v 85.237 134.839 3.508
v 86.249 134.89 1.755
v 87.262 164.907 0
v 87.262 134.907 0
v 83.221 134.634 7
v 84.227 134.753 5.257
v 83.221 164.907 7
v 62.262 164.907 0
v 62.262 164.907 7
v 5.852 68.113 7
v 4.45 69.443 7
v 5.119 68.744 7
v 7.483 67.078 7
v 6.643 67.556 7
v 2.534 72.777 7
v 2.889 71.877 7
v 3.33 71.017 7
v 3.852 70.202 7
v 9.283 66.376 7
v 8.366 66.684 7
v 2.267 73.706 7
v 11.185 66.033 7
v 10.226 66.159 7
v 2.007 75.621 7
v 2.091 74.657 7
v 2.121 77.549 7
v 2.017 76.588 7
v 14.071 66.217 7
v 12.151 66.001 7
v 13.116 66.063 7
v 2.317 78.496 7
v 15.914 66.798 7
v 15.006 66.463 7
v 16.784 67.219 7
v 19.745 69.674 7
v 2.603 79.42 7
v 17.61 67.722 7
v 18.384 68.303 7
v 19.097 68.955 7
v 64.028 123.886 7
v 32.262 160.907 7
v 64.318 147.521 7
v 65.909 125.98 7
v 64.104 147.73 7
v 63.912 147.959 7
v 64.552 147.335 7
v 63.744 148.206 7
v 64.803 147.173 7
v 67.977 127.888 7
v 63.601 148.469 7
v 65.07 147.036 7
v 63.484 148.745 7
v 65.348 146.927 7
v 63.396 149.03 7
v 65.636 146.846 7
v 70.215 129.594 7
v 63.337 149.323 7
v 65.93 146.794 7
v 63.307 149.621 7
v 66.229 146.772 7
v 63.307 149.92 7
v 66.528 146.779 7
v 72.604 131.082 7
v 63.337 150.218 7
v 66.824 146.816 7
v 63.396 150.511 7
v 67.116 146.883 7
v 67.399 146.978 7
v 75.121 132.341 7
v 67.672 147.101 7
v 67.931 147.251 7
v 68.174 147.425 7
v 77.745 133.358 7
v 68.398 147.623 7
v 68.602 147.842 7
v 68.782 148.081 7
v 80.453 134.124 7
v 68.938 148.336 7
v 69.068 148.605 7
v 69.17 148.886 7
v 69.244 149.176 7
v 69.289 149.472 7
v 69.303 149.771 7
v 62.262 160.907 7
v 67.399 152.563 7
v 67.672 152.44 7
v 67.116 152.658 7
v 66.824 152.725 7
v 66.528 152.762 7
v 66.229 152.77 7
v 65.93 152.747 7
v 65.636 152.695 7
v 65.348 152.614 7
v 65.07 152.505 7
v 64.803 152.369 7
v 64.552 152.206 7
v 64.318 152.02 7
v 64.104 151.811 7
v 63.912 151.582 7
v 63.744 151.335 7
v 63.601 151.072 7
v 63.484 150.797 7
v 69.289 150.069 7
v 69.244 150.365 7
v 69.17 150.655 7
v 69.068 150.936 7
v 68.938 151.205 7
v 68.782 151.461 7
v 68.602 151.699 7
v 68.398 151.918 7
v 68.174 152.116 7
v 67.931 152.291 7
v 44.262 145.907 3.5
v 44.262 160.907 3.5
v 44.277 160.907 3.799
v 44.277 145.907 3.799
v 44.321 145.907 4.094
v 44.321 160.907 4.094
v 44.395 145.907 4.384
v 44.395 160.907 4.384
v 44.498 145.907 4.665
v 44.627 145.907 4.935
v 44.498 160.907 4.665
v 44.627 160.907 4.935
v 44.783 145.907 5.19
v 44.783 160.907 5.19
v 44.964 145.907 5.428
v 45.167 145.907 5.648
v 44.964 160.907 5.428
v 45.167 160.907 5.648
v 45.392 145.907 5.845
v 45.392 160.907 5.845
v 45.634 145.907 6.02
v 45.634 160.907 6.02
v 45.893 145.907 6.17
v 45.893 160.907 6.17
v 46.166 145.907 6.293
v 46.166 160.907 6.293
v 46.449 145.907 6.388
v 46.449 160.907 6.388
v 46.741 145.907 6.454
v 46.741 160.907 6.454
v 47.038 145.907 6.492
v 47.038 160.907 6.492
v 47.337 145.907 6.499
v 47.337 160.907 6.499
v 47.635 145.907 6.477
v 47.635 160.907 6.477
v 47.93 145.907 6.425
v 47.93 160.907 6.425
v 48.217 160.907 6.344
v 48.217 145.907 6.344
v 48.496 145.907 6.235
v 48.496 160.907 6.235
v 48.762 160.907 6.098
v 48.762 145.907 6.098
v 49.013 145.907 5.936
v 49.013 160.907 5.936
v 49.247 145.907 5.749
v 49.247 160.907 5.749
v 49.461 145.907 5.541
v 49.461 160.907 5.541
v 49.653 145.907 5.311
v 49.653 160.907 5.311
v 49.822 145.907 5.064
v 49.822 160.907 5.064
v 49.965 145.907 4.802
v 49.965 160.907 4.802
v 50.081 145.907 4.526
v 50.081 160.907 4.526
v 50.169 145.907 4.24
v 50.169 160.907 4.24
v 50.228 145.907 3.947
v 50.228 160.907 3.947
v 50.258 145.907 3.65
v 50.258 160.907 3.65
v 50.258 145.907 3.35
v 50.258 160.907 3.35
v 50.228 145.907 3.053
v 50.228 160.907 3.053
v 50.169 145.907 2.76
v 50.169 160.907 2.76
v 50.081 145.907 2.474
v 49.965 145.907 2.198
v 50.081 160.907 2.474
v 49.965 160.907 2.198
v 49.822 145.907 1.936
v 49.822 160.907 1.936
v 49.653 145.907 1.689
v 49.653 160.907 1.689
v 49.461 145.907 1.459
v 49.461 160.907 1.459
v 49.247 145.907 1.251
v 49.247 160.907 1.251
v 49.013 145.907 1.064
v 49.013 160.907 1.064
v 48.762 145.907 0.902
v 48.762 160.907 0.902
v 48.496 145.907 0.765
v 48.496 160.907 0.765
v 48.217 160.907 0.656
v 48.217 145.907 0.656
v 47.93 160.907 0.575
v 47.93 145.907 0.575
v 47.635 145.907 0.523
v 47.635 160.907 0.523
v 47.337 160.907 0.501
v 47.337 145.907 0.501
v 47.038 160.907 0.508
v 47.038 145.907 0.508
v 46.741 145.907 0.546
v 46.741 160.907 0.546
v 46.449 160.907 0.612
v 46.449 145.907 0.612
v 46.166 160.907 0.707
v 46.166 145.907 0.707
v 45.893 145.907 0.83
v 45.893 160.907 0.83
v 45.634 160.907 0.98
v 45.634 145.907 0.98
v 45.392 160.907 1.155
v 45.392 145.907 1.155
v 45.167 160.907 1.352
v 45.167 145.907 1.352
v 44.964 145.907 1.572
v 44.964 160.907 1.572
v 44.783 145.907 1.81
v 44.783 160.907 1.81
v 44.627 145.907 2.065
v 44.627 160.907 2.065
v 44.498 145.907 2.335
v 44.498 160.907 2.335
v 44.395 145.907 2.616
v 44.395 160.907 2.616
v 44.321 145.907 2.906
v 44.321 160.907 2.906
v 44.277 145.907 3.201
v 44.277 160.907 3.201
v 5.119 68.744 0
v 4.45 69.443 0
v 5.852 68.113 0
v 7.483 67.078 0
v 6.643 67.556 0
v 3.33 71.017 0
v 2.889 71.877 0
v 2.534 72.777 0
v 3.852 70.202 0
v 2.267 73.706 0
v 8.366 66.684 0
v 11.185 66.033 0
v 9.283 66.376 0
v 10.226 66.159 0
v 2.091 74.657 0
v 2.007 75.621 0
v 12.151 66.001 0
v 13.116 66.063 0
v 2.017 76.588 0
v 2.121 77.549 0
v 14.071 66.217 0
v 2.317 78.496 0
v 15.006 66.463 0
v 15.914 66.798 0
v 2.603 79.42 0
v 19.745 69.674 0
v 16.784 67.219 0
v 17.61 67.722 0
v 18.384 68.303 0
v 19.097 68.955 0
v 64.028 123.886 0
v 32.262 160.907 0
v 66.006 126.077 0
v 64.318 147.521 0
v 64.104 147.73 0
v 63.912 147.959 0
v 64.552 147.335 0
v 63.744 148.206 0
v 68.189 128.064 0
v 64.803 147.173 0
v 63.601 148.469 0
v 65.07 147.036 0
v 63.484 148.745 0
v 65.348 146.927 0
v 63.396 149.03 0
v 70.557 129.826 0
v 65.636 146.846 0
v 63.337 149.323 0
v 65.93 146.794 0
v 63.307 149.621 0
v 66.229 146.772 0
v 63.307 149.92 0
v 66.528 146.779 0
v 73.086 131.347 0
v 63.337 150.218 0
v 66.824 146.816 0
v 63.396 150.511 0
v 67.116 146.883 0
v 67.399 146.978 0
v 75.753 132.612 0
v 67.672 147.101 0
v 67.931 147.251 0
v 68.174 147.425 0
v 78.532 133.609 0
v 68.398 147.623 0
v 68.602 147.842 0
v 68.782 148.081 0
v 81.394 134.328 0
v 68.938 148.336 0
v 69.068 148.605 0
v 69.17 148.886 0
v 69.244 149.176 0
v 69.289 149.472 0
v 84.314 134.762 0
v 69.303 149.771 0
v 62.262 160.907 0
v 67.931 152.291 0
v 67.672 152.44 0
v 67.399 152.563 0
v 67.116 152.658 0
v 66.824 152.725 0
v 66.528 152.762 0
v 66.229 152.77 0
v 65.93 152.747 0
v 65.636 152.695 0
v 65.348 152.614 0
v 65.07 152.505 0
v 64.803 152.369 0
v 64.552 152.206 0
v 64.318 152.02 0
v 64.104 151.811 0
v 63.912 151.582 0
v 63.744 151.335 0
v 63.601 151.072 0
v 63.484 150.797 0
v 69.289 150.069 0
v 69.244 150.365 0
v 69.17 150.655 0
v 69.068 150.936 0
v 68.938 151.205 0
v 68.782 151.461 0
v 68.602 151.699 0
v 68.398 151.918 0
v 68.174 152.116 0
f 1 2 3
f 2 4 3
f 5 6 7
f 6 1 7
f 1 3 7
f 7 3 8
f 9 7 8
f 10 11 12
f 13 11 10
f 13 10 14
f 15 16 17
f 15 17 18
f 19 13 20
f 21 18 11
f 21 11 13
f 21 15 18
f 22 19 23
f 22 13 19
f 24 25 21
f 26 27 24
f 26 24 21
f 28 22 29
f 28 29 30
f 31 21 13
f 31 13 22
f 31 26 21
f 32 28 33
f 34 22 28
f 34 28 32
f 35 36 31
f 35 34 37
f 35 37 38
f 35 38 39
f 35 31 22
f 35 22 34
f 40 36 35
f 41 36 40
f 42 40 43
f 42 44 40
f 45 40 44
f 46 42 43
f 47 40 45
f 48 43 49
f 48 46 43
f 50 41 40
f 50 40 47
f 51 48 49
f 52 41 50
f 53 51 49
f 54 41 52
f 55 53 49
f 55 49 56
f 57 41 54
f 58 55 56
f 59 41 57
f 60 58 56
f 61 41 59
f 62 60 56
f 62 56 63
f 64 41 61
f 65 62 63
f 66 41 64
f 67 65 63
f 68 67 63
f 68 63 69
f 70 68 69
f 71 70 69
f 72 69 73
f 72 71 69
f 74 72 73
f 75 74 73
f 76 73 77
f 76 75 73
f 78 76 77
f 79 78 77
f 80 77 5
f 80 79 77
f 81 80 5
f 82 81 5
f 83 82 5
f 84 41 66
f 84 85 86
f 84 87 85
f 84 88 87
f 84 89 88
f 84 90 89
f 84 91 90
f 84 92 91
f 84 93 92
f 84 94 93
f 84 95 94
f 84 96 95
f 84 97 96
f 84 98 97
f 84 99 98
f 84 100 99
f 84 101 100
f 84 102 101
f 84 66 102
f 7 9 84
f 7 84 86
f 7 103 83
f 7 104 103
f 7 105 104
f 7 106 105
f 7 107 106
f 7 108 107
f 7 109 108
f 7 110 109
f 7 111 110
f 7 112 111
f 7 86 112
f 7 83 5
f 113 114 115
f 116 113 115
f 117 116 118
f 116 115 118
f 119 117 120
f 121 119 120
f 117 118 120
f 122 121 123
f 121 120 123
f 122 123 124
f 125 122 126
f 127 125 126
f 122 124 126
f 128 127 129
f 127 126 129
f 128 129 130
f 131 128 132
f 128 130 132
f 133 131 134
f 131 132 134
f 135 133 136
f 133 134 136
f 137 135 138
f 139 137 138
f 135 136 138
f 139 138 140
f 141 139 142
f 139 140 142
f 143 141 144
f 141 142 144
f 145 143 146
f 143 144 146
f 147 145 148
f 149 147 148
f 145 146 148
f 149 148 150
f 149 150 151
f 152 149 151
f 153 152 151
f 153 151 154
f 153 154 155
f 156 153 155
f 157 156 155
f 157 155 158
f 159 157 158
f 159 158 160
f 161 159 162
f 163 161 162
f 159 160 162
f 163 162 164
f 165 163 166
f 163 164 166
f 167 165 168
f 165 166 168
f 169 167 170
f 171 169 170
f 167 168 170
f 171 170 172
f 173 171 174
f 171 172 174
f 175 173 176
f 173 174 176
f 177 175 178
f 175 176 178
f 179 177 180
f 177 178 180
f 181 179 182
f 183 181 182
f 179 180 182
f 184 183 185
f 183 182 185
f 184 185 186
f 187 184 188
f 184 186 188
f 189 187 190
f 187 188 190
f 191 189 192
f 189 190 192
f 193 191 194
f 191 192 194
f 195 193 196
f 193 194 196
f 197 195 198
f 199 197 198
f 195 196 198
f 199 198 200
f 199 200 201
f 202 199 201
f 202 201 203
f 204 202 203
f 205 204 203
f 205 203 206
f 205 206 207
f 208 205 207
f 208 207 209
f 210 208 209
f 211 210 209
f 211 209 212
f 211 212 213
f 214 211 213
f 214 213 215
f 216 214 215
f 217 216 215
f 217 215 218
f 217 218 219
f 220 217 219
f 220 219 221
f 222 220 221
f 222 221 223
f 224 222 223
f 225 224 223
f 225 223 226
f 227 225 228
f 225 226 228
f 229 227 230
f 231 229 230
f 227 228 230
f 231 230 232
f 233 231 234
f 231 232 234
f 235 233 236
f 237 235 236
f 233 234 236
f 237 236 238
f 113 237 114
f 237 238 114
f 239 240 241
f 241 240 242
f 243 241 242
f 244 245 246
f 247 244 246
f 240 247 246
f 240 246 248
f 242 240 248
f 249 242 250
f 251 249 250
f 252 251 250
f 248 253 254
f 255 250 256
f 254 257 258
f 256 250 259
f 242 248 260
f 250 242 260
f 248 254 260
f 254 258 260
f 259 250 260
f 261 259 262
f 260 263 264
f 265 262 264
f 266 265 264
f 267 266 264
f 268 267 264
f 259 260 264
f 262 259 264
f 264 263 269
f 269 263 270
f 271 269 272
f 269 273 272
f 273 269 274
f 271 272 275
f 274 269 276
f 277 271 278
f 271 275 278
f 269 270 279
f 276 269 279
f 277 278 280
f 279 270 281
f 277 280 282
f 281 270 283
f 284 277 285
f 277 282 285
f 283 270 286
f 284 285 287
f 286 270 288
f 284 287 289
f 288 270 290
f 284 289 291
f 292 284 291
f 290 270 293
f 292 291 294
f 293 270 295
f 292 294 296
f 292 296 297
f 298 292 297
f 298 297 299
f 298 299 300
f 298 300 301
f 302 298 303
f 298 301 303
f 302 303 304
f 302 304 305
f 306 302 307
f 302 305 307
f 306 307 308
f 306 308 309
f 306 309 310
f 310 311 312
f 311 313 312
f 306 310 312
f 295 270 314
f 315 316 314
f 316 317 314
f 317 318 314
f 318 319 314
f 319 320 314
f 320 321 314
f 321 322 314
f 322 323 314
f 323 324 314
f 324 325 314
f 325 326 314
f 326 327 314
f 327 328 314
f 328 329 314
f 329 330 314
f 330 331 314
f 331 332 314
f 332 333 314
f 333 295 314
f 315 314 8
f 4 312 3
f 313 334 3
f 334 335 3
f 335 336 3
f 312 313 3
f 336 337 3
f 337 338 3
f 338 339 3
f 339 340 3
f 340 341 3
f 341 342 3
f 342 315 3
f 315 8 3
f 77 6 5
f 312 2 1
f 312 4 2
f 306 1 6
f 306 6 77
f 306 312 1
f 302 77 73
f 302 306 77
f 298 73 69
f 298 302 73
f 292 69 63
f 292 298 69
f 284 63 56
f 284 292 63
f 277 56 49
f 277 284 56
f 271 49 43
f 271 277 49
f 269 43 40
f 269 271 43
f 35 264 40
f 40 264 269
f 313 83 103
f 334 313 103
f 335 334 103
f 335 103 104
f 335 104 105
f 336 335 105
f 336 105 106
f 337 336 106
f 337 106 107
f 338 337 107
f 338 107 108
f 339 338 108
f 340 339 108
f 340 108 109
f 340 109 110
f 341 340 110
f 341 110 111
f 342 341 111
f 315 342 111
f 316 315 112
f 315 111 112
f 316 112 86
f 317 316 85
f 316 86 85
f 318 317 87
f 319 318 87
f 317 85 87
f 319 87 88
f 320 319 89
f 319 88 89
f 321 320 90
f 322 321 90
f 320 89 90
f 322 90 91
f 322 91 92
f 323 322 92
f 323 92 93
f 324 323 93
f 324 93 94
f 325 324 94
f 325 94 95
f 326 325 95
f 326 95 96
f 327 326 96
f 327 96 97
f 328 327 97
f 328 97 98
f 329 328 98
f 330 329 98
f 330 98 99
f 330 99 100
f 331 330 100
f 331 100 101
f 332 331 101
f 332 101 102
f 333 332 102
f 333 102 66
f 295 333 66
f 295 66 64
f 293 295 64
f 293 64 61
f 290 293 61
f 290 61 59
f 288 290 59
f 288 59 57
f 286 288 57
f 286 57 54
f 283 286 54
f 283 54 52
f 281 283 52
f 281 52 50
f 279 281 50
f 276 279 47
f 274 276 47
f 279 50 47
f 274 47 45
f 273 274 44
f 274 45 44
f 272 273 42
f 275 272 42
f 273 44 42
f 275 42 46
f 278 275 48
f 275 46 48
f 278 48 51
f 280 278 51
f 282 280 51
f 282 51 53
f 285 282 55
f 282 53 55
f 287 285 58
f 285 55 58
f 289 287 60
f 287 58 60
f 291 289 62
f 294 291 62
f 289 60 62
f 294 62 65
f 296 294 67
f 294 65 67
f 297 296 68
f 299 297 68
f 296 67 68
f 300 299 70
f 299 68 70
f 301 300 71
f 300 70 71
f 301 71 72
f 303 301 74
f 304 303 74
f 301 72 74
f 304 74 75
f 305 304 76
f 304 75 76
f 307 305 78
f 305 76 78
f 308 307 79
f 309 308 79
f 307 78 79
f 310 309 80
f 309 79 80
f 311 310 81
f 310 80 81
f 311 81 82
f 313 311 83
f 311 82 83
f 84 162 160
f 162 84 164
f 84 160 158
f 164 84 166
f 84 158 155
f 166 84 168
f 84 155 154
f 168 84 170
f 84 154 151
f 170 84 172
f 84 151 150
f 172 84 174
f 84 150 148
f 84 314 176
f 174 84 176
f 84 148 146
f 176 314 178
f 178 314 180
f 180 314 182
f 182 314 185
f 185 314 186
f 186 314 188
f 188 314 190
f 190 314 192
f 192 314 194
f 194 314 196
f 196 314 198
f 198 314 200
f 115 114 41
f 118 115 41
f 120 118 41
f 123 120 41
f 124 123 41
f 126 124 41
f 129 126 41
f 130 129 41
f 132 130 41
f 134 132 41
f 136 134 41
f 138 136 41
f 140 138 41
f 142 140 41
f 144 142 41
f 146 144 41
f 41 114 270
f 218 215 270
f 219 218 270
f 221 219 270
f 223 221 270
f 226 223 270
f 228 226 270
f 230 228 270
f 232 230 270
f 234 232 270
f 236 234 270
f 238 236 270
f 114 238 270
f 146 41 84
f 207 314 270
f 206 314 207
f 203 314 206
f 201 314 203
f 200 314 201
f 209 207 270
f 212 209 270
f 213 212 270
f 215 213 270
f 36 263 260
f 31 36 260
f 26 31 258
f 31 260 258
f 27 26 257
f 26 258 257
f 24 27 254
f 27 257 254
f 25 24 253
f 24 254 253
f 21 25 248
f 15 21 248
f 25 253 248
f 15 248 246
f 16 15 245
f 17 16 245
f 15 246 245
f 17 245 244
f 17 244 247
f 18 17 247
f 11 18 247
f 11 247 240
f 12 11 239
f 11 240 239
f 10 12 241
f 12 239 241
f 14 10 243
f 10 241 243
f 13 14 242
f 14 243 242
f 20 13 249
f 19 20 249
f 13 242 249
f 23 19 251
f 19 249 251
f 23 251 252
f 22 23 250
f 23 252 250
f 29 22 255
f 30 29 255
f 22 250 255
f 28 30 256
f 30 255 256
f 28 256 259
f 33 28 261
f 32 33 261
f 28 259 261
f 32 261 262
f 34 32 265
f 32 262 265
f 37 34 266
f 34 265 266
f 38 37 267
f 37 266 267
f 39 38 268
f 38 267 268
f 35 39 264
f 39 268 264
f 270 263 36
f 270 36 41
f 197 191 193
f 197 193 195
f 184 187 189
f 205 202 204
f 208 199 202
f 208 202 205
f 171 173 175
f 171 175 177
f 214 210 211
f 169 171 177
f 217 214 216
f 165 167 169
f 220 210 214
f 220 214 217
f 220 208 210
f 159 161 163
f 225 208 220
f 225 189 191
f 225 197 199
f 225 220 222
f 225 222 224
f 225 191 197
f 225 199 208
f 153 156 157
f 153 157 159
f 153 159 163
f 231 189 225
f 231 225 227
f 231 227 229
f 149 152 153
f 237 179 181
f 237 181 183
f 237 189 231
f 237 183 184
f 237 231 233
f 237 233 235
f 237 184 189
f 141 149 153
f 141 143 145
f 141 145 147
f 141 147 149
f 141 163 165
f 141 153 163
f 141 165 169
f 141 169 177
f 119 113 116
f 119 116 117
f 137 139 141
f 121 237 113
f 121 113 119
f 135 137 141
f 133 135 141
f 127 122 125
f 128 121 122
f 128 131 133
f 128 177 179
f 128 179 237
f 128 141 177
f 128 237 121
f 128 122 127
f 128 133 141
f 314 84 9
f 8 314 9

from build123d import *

# Parameters (mm, degrees)
PAD002_DEPTH    = 7
SKETCH025_R     = 3
POCKET018_DEPTH = 15
POCKET019_DEPTH = 98.908358
SKETCH028_R     = 3
POCKET021_DEPTH = 7.001


with BuildPart() as part:
    # Sketch023 → Pad002 (new body)
    with BuildSketch(Plane.XY):
        with BuildLine():
            Line((75.261973, 88.907358), (50.261973, 88.907358))
            Line((50.261973, 84.907358), (50.261973, 88.907358))
            Line((50.261973, 84.907358), (20.261973, 84.907358))
            Line((-9.396926, 3.420201), (20.261973, 84.907358))
            ThreePointArc((-9.396926, 3.420201), (-4.942745, -8.693059), (7.744606, -6.326221))
            Line((7.744606, -6.326221), (52.028155, 47.886022))
            ThreePointArc((75.261973, 58.907358), (62.404289, 56.012339), (52.028155, 47.886022))
            Line((75.261973, 88.907358), (75.261973, 58.907358))
        make_face()
    extrude(amount=PAD002_DEPTH)

    # Sketch025 (on Face4 of Pad002) → Pocket018 (cut)
    with BuildSketch(Plane(origin=(0, 84.907358, 0), x_dir=(-1, 0, 0), z_dir=(0, 1, 0))):
        with Locations((-35.261973, 3.5)):
            Circle(SKETCH025_R)
    extrude(amount=-POCKET018_DEPTH, mode=Mode.SUBTRACT)

    # Sketch026 (on Face2 of Pocket018) → Pocket019 (cut, through all)
    with BuildSketch(Plane(origin=(0, 88.907358, 0), x_dir=(-1, 0, 0), z_dir=(0, 1, 0))):
        Polygon((-75.261973, 7), (-75.261973, 0), (-71.220521, 7), align=None)
    extrude(amount=-POCKET019_DEPTH, mode=Mode.SUBTRACT)

    # Sketch028 → Pocket021 (cut, through all)
    with BuildSketch(Plane.XY.offset(7)):
        with Locations((54.303425, 73.770624)):
            Circle(SKETCH028_R)
    extrude(amount=-POCKET021_DEPTH, mode=Mode.SUBTRACT)


with BuildPart() as part_1:
    # Body002 placement: moved
    add(part.part.moved(Location((-250, 0, 0))))


with BuildPart() as part_2:
    # Clone placement: moved
    add(part_1.part.moved(Location((262, 76, 0))))


solid = part_2.part
